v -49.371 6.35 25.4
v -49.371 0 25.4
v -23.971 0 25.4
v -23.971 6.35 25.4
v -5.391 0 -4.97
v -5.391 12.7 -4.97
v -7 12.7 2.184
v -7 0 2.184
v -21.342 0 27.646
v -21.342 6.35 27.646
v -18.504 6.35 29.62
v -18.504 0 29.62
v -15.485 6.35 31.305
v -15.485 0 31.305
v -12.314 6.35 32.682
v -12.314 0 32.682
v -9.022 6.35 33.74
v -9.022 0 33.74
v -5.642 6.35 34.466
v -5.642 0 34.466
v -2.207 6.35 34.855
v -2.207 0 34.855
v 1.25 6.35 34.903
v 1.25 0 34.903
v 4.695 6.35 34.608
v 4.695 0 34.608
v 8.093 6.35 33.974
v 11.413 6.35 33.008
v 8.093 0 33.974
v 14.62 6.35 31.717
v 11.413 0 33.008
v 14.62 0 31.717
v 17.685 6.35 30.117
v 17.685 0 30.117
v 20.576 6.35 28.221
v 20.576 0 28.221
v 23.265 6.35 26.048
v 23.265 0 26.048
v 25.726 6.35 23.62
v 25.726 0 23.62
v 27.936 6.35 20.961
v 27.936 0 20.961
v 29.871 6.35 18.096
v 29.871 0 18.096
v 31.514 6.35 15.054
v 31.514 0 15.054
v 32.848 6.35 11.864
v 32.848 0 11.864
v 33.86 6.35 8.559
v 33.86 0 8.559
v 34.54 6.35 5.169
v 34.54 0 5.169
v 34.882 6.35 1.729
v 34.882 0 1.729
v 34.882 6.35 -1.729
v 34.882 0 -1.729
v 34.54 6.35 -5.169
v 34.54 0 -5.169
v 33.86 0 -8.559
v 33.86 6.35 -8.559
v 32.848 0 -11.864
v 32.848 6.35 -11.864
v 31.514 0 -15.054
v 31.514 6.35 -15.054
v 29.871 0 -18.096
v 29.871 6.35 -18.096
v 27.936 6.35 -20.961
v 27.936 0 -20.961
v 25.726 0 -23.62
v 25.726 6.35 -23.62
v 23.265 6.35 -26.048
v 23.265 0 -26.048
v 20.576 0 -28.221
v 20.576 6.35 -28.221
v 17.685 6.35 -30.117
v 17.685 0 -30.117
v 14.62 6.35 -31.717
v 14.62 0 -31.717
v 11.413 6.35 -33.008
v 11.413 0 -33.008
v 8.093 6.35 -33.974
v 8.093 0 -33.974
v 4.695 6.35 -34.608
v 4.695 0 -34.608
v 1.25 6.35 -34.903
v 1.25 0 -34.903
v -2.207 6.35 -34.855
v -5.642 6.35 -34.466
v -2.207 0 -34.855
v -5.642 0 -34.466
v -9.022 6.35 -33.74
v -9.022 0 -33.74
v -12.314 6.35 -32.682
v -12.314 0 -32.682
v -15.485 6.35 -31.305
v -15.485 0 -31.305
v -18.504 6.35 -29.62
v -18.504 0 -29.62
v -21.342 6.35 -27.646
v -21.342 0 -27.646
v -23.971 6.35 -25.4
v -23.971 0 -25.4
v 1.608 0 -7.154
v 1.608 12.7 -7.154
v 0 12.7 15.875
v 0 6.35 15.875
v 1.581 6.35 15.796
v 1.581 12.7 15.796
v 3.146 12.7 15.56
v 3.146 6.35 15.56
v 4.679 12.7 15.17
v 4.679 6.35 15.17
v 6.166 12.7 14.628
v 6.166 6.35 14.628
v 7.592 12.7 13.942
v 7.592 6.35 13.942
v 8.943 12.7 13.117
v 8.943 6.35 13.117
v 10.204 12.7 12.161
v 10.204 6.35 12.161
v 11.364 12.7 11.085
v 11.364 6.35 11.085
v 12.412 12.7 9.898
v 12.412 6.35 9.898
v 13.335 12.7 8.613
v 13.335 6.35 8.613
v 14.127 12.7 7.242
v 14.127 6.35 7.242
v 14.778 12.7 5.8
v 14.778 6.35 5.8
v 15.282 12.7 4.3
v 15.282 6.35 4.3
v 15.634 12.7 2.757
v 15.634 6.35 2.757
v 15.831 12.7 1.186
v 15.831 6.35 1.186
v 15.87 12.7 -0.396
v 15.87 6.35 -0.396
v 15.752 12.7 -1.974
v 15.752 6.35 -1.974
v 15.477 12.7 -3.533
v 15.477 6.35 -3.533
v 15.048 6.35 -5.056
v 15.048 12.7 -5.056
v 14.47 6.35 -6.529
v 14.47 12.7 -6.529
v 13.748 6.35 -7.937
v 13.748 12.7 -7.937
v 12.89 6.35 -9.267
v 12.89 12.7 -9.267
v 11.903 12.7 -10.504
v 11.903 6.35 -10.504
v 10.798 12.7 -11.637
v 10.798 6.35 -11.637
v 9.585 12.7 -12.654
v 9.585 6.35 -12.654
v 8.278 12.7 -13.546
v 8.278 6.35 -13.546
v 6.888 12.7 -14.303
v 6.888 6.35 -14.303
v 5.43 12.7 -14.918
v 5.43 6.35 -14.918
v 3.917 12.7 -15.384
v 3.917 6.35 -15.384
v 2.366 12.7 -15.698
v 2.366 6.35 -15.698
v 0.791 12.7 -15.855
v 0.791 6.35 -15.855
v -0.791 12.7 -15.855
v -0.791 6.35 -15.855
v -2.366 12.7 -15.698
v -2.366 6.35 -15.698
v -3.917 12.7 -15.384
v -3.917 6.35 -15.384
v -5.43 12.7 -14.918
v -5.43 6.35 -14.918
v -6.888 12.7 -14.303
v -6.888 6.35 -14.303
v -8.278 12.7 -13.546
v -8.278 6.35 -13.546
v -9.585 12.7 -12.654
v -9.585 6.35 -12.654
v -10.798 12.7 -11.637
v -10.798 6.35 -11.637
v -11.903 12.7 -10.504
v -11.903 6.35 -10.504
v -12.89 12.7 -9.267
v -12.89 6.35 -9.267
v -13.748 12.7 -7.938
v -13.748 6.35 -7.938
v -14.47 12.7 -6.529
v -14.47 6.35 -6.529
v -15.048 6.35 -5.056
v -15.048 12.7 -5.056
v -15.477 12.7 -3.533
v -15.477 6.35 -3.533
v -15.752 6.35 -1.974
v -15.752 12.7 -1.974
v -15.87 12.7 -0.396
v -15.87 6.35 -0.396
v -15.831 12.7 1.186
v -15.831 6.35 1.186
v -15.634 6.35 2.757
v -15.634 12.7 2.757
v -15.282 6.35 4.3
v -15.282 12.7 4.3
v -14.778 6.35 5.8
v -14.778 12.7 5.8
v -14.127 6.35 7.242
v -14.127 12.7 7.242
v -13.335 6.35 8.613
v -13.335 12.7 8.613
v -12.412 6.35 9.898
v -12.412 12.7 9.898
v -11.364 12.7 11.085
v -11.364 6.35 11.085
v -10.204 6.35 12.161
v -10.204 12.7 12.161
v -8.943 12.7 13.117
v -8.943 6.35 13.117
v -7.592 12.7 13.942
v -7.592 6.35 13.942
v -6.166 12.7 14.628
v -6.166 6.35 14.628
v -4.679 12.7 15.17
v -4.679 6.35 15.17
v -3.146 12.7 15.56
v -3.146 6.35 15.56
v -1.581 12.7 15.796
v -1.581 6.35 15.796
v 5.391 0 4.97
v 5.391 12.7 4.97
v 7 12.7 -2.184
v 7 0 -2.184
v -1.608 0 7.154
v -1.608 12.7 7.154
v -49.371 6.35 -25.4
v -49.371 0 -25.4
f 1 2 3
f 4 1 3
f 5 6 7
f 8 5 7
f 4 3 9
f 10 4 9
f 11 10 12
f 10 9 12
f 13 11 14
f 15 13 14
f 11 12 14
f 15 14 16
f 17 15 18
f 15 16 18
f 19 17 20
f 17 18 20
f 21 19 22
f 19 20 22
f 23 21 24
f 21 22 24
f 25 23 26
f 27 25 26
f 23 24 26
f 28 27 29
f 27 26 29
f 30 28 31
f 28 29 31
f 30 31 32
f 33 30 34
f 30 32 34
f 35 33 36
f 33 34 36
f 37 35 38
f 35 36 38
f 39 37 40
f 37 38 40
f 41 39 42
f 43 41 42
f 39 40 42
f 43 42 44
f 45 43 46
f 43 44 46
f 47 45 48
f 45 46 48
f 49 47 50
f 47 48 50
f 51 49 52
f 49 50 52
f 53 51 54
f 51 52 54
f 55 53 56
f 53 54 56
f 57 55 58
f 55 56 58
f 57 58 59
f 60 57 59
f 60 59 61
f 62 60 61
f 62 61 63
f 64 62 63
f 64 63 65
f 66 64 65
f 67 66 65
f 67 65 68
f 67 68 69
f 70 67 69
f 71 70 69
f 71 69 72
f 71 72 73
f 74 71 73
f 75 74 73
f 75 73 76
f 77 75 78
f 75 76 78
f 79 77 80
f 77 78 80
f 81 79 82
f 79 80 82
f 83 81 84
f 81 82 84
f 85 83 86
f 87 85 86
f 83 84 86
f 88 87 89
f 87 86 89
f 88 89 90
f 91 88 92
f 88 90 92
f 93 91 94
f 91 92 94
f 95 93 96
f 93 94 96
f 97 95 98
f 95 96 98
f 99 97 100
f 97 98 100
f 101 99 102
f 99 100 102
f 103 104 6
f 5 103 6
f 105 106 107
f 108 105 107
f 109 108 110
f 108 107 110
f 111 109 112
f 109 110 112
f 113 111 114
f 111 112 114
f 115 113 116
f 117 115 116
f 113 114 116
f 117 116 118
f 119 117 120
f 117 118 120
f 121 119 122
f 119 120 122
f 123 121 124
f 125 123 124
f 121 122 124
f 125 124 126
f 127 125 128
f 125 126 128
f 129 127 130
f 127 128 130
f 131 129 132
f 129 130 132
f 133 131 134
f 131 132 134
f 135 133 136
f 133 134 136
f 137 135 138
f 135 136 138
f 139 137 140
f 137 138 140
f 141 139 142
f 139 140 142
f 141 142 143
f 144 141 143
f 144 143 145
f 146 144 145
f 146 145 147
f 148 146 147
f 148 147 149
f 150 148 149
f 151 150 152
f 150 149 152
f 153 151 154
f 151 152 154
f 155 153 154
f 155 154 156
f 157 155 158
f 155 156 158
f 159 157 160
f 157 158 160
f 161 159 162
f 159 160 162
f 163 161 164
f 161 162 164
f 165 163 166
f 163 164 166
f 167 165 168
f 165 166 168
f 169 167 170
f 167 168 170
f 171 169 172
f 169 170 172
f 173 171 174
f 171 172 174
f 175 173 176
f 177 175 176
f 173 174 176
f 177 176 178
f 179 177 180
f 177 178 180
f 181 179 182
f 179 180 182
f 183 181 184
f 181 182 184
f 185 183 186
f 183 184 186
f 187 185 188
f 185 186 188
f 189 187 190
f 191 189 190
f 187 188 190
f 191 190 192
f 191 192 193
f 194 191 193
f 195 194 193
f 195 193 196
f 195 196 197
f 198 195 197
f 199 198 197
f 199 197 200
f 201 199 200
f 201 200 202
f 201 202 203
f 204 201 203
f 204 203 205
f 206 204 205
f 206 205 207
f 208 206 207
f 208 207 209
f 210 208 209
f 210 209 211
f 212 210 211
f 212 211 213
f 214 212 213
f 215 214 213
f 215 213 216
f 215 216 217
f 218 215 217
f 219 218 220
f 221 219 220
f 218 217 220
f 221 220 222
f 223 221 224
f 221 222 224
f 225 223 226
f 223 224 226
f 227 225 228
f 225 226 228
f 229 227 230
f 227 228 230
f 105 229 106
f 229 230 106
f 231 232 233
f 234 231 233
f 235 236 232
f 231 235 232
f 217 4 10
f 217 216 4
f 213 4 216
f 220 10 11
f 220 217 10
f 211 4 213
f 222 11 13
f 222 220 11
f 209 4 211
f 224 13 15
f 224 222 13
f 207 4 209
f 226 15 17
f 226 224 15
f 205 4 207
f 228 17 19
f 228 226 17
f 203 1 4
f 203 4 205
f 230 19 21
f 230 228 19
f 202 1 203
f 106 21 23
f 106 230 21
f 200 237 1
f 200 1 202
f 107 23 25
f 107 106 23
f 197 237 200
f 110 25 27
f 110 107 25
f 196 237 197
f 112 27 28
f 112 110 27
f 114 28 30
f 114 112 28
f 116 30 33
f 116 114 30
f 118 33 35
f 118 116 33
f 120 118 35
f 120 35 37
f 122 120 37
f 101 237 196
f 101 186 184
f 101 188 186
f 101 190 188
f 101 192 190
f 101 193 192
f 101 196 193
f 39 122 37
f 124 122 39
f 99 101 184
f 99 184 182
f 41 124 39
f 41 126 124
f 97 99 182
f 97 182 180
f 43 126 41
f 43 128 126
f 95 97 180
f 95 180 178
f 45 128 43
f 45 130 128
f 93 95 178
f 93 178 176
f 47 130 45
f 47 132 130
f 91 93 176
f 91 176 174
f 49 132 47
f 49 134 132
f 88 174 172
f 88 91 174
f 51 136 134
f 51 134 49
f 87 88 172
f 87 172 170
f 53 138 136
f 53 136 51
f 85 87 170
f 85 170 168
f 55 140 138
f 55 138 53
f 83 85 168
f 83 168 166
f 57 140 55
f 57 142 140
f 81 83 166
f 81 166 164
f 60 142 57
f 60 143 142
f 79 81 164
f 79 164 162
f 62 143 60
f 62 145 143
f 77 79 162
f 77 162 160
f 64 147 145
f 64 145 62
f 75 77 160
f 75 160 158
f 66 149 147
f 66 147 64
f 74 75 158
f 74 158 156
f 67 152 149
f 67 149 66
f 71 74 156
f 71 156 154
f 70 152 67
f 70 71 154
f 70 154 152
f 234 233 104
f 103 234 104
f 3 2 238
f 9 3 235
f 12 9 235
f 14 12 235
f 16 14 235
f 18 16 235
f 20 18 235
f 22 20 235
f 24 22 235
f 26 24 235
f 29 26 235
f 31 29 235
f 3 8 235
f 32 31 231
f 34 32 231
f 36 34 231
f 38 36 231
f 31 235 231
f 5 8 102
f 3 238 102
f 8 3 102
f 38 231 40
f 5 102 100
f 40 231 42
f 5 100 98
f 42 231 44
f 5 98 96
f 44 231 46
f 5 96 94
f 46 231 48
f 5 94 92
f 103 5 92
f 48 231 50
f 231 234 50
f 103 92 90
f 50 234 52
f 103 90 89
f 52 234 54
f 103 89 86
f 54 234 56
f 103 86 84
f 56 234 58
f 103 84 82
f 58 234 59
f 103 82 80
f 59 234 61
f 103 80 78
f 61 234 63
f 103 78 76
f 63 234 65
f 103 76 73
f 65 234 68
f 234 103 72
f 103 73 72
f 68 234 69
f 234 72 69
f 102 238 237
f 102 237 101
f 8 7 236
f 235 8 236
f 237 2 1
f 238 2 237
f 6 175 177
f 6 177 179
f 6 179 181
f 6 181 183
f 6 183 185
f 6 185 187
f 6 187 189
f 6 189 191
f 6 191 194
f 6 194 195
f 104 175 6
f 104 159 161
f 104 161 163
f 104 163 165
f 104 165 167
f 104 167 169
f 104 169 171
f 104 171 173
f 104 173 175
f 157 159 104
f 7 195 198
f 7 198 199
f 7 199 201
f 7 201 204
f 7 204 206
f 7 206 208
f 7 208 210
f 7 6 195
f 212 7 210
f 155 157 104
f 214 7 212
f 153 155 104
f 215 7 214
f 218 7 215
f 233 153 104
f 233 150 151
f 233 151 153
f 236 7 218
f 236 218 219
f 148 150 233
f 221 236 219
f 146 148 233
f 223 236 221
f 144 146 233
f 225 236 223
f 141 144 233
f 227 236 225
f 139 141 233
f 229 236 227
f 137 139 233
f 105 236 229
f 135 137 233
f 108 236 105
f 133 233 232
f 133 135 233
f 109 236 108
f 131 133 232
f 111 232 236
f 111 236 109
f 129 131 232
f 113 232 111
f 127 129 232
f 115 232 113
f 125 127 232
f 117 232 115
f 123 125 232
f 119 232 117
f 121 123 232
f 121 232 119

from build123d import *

# Parameters (mm, degrees)
SKETCH1_R           = 34.925
SKETCH1_W           = 25.4
SKETCH1_H           = 50.8
BOSS_EXTRUDE1_DEPTH = 6.35
SKETCH2_R           = 15.875
BOSS_EXTRUDE2_DEPTH = 6.35
CUT_EXTRUDE1_DEPTH  = 62.794126307


with BuildPart() as part:
    # Sketch1 → Boss-Extrude1 (new body)
    with BuildSketch(Plane(origin=(0, 0, 0), x_dir=(1, 0, 0), z_dir=(0, 1, 0))):
        Circle(SKETCH1_R)
        with Locations((-36.670724332, 0)):
            Rectangle(SKETCH1_W, SKETCH1_H)
    extrude(amount=BOSS_EXTRUDE1_DEPTH)

    # Sketch2 → Boss-Extrude2 (add)
    with BuildSketch(Plane(origin=(0, 6.35, 0), x_dir=(1, 0, 0), z_dir=(0, 1, 0))):
        with Locations(Location((0, 0, 0), (0, 0, 270))):
            Circle(SKETCH2_R)
    extrude(amount=BOSS_EXTRUDE2_DEPTH)

    # Sketch3 → Cut-Extrude1 (cut, through all)
    with BuildSketch(Plane(origin=(0, 12.7, 0), x_dir=(1, 0, 0), z_dir=(0, 1, 0))):
        Polygon((5.391213117, -4.969723781), (6.999513603, 2.184065626), (1.608300486, 7.153789407), (-5.391213117, 4.969723781), (-6.999513603, -2.184065626), (-1.608300486, -7.153789407), align=None)
    extrude(amount=-CUT_EXTRUDE1_DEPTH, mode=Mode.SUBTRACT)


solid = part.part
